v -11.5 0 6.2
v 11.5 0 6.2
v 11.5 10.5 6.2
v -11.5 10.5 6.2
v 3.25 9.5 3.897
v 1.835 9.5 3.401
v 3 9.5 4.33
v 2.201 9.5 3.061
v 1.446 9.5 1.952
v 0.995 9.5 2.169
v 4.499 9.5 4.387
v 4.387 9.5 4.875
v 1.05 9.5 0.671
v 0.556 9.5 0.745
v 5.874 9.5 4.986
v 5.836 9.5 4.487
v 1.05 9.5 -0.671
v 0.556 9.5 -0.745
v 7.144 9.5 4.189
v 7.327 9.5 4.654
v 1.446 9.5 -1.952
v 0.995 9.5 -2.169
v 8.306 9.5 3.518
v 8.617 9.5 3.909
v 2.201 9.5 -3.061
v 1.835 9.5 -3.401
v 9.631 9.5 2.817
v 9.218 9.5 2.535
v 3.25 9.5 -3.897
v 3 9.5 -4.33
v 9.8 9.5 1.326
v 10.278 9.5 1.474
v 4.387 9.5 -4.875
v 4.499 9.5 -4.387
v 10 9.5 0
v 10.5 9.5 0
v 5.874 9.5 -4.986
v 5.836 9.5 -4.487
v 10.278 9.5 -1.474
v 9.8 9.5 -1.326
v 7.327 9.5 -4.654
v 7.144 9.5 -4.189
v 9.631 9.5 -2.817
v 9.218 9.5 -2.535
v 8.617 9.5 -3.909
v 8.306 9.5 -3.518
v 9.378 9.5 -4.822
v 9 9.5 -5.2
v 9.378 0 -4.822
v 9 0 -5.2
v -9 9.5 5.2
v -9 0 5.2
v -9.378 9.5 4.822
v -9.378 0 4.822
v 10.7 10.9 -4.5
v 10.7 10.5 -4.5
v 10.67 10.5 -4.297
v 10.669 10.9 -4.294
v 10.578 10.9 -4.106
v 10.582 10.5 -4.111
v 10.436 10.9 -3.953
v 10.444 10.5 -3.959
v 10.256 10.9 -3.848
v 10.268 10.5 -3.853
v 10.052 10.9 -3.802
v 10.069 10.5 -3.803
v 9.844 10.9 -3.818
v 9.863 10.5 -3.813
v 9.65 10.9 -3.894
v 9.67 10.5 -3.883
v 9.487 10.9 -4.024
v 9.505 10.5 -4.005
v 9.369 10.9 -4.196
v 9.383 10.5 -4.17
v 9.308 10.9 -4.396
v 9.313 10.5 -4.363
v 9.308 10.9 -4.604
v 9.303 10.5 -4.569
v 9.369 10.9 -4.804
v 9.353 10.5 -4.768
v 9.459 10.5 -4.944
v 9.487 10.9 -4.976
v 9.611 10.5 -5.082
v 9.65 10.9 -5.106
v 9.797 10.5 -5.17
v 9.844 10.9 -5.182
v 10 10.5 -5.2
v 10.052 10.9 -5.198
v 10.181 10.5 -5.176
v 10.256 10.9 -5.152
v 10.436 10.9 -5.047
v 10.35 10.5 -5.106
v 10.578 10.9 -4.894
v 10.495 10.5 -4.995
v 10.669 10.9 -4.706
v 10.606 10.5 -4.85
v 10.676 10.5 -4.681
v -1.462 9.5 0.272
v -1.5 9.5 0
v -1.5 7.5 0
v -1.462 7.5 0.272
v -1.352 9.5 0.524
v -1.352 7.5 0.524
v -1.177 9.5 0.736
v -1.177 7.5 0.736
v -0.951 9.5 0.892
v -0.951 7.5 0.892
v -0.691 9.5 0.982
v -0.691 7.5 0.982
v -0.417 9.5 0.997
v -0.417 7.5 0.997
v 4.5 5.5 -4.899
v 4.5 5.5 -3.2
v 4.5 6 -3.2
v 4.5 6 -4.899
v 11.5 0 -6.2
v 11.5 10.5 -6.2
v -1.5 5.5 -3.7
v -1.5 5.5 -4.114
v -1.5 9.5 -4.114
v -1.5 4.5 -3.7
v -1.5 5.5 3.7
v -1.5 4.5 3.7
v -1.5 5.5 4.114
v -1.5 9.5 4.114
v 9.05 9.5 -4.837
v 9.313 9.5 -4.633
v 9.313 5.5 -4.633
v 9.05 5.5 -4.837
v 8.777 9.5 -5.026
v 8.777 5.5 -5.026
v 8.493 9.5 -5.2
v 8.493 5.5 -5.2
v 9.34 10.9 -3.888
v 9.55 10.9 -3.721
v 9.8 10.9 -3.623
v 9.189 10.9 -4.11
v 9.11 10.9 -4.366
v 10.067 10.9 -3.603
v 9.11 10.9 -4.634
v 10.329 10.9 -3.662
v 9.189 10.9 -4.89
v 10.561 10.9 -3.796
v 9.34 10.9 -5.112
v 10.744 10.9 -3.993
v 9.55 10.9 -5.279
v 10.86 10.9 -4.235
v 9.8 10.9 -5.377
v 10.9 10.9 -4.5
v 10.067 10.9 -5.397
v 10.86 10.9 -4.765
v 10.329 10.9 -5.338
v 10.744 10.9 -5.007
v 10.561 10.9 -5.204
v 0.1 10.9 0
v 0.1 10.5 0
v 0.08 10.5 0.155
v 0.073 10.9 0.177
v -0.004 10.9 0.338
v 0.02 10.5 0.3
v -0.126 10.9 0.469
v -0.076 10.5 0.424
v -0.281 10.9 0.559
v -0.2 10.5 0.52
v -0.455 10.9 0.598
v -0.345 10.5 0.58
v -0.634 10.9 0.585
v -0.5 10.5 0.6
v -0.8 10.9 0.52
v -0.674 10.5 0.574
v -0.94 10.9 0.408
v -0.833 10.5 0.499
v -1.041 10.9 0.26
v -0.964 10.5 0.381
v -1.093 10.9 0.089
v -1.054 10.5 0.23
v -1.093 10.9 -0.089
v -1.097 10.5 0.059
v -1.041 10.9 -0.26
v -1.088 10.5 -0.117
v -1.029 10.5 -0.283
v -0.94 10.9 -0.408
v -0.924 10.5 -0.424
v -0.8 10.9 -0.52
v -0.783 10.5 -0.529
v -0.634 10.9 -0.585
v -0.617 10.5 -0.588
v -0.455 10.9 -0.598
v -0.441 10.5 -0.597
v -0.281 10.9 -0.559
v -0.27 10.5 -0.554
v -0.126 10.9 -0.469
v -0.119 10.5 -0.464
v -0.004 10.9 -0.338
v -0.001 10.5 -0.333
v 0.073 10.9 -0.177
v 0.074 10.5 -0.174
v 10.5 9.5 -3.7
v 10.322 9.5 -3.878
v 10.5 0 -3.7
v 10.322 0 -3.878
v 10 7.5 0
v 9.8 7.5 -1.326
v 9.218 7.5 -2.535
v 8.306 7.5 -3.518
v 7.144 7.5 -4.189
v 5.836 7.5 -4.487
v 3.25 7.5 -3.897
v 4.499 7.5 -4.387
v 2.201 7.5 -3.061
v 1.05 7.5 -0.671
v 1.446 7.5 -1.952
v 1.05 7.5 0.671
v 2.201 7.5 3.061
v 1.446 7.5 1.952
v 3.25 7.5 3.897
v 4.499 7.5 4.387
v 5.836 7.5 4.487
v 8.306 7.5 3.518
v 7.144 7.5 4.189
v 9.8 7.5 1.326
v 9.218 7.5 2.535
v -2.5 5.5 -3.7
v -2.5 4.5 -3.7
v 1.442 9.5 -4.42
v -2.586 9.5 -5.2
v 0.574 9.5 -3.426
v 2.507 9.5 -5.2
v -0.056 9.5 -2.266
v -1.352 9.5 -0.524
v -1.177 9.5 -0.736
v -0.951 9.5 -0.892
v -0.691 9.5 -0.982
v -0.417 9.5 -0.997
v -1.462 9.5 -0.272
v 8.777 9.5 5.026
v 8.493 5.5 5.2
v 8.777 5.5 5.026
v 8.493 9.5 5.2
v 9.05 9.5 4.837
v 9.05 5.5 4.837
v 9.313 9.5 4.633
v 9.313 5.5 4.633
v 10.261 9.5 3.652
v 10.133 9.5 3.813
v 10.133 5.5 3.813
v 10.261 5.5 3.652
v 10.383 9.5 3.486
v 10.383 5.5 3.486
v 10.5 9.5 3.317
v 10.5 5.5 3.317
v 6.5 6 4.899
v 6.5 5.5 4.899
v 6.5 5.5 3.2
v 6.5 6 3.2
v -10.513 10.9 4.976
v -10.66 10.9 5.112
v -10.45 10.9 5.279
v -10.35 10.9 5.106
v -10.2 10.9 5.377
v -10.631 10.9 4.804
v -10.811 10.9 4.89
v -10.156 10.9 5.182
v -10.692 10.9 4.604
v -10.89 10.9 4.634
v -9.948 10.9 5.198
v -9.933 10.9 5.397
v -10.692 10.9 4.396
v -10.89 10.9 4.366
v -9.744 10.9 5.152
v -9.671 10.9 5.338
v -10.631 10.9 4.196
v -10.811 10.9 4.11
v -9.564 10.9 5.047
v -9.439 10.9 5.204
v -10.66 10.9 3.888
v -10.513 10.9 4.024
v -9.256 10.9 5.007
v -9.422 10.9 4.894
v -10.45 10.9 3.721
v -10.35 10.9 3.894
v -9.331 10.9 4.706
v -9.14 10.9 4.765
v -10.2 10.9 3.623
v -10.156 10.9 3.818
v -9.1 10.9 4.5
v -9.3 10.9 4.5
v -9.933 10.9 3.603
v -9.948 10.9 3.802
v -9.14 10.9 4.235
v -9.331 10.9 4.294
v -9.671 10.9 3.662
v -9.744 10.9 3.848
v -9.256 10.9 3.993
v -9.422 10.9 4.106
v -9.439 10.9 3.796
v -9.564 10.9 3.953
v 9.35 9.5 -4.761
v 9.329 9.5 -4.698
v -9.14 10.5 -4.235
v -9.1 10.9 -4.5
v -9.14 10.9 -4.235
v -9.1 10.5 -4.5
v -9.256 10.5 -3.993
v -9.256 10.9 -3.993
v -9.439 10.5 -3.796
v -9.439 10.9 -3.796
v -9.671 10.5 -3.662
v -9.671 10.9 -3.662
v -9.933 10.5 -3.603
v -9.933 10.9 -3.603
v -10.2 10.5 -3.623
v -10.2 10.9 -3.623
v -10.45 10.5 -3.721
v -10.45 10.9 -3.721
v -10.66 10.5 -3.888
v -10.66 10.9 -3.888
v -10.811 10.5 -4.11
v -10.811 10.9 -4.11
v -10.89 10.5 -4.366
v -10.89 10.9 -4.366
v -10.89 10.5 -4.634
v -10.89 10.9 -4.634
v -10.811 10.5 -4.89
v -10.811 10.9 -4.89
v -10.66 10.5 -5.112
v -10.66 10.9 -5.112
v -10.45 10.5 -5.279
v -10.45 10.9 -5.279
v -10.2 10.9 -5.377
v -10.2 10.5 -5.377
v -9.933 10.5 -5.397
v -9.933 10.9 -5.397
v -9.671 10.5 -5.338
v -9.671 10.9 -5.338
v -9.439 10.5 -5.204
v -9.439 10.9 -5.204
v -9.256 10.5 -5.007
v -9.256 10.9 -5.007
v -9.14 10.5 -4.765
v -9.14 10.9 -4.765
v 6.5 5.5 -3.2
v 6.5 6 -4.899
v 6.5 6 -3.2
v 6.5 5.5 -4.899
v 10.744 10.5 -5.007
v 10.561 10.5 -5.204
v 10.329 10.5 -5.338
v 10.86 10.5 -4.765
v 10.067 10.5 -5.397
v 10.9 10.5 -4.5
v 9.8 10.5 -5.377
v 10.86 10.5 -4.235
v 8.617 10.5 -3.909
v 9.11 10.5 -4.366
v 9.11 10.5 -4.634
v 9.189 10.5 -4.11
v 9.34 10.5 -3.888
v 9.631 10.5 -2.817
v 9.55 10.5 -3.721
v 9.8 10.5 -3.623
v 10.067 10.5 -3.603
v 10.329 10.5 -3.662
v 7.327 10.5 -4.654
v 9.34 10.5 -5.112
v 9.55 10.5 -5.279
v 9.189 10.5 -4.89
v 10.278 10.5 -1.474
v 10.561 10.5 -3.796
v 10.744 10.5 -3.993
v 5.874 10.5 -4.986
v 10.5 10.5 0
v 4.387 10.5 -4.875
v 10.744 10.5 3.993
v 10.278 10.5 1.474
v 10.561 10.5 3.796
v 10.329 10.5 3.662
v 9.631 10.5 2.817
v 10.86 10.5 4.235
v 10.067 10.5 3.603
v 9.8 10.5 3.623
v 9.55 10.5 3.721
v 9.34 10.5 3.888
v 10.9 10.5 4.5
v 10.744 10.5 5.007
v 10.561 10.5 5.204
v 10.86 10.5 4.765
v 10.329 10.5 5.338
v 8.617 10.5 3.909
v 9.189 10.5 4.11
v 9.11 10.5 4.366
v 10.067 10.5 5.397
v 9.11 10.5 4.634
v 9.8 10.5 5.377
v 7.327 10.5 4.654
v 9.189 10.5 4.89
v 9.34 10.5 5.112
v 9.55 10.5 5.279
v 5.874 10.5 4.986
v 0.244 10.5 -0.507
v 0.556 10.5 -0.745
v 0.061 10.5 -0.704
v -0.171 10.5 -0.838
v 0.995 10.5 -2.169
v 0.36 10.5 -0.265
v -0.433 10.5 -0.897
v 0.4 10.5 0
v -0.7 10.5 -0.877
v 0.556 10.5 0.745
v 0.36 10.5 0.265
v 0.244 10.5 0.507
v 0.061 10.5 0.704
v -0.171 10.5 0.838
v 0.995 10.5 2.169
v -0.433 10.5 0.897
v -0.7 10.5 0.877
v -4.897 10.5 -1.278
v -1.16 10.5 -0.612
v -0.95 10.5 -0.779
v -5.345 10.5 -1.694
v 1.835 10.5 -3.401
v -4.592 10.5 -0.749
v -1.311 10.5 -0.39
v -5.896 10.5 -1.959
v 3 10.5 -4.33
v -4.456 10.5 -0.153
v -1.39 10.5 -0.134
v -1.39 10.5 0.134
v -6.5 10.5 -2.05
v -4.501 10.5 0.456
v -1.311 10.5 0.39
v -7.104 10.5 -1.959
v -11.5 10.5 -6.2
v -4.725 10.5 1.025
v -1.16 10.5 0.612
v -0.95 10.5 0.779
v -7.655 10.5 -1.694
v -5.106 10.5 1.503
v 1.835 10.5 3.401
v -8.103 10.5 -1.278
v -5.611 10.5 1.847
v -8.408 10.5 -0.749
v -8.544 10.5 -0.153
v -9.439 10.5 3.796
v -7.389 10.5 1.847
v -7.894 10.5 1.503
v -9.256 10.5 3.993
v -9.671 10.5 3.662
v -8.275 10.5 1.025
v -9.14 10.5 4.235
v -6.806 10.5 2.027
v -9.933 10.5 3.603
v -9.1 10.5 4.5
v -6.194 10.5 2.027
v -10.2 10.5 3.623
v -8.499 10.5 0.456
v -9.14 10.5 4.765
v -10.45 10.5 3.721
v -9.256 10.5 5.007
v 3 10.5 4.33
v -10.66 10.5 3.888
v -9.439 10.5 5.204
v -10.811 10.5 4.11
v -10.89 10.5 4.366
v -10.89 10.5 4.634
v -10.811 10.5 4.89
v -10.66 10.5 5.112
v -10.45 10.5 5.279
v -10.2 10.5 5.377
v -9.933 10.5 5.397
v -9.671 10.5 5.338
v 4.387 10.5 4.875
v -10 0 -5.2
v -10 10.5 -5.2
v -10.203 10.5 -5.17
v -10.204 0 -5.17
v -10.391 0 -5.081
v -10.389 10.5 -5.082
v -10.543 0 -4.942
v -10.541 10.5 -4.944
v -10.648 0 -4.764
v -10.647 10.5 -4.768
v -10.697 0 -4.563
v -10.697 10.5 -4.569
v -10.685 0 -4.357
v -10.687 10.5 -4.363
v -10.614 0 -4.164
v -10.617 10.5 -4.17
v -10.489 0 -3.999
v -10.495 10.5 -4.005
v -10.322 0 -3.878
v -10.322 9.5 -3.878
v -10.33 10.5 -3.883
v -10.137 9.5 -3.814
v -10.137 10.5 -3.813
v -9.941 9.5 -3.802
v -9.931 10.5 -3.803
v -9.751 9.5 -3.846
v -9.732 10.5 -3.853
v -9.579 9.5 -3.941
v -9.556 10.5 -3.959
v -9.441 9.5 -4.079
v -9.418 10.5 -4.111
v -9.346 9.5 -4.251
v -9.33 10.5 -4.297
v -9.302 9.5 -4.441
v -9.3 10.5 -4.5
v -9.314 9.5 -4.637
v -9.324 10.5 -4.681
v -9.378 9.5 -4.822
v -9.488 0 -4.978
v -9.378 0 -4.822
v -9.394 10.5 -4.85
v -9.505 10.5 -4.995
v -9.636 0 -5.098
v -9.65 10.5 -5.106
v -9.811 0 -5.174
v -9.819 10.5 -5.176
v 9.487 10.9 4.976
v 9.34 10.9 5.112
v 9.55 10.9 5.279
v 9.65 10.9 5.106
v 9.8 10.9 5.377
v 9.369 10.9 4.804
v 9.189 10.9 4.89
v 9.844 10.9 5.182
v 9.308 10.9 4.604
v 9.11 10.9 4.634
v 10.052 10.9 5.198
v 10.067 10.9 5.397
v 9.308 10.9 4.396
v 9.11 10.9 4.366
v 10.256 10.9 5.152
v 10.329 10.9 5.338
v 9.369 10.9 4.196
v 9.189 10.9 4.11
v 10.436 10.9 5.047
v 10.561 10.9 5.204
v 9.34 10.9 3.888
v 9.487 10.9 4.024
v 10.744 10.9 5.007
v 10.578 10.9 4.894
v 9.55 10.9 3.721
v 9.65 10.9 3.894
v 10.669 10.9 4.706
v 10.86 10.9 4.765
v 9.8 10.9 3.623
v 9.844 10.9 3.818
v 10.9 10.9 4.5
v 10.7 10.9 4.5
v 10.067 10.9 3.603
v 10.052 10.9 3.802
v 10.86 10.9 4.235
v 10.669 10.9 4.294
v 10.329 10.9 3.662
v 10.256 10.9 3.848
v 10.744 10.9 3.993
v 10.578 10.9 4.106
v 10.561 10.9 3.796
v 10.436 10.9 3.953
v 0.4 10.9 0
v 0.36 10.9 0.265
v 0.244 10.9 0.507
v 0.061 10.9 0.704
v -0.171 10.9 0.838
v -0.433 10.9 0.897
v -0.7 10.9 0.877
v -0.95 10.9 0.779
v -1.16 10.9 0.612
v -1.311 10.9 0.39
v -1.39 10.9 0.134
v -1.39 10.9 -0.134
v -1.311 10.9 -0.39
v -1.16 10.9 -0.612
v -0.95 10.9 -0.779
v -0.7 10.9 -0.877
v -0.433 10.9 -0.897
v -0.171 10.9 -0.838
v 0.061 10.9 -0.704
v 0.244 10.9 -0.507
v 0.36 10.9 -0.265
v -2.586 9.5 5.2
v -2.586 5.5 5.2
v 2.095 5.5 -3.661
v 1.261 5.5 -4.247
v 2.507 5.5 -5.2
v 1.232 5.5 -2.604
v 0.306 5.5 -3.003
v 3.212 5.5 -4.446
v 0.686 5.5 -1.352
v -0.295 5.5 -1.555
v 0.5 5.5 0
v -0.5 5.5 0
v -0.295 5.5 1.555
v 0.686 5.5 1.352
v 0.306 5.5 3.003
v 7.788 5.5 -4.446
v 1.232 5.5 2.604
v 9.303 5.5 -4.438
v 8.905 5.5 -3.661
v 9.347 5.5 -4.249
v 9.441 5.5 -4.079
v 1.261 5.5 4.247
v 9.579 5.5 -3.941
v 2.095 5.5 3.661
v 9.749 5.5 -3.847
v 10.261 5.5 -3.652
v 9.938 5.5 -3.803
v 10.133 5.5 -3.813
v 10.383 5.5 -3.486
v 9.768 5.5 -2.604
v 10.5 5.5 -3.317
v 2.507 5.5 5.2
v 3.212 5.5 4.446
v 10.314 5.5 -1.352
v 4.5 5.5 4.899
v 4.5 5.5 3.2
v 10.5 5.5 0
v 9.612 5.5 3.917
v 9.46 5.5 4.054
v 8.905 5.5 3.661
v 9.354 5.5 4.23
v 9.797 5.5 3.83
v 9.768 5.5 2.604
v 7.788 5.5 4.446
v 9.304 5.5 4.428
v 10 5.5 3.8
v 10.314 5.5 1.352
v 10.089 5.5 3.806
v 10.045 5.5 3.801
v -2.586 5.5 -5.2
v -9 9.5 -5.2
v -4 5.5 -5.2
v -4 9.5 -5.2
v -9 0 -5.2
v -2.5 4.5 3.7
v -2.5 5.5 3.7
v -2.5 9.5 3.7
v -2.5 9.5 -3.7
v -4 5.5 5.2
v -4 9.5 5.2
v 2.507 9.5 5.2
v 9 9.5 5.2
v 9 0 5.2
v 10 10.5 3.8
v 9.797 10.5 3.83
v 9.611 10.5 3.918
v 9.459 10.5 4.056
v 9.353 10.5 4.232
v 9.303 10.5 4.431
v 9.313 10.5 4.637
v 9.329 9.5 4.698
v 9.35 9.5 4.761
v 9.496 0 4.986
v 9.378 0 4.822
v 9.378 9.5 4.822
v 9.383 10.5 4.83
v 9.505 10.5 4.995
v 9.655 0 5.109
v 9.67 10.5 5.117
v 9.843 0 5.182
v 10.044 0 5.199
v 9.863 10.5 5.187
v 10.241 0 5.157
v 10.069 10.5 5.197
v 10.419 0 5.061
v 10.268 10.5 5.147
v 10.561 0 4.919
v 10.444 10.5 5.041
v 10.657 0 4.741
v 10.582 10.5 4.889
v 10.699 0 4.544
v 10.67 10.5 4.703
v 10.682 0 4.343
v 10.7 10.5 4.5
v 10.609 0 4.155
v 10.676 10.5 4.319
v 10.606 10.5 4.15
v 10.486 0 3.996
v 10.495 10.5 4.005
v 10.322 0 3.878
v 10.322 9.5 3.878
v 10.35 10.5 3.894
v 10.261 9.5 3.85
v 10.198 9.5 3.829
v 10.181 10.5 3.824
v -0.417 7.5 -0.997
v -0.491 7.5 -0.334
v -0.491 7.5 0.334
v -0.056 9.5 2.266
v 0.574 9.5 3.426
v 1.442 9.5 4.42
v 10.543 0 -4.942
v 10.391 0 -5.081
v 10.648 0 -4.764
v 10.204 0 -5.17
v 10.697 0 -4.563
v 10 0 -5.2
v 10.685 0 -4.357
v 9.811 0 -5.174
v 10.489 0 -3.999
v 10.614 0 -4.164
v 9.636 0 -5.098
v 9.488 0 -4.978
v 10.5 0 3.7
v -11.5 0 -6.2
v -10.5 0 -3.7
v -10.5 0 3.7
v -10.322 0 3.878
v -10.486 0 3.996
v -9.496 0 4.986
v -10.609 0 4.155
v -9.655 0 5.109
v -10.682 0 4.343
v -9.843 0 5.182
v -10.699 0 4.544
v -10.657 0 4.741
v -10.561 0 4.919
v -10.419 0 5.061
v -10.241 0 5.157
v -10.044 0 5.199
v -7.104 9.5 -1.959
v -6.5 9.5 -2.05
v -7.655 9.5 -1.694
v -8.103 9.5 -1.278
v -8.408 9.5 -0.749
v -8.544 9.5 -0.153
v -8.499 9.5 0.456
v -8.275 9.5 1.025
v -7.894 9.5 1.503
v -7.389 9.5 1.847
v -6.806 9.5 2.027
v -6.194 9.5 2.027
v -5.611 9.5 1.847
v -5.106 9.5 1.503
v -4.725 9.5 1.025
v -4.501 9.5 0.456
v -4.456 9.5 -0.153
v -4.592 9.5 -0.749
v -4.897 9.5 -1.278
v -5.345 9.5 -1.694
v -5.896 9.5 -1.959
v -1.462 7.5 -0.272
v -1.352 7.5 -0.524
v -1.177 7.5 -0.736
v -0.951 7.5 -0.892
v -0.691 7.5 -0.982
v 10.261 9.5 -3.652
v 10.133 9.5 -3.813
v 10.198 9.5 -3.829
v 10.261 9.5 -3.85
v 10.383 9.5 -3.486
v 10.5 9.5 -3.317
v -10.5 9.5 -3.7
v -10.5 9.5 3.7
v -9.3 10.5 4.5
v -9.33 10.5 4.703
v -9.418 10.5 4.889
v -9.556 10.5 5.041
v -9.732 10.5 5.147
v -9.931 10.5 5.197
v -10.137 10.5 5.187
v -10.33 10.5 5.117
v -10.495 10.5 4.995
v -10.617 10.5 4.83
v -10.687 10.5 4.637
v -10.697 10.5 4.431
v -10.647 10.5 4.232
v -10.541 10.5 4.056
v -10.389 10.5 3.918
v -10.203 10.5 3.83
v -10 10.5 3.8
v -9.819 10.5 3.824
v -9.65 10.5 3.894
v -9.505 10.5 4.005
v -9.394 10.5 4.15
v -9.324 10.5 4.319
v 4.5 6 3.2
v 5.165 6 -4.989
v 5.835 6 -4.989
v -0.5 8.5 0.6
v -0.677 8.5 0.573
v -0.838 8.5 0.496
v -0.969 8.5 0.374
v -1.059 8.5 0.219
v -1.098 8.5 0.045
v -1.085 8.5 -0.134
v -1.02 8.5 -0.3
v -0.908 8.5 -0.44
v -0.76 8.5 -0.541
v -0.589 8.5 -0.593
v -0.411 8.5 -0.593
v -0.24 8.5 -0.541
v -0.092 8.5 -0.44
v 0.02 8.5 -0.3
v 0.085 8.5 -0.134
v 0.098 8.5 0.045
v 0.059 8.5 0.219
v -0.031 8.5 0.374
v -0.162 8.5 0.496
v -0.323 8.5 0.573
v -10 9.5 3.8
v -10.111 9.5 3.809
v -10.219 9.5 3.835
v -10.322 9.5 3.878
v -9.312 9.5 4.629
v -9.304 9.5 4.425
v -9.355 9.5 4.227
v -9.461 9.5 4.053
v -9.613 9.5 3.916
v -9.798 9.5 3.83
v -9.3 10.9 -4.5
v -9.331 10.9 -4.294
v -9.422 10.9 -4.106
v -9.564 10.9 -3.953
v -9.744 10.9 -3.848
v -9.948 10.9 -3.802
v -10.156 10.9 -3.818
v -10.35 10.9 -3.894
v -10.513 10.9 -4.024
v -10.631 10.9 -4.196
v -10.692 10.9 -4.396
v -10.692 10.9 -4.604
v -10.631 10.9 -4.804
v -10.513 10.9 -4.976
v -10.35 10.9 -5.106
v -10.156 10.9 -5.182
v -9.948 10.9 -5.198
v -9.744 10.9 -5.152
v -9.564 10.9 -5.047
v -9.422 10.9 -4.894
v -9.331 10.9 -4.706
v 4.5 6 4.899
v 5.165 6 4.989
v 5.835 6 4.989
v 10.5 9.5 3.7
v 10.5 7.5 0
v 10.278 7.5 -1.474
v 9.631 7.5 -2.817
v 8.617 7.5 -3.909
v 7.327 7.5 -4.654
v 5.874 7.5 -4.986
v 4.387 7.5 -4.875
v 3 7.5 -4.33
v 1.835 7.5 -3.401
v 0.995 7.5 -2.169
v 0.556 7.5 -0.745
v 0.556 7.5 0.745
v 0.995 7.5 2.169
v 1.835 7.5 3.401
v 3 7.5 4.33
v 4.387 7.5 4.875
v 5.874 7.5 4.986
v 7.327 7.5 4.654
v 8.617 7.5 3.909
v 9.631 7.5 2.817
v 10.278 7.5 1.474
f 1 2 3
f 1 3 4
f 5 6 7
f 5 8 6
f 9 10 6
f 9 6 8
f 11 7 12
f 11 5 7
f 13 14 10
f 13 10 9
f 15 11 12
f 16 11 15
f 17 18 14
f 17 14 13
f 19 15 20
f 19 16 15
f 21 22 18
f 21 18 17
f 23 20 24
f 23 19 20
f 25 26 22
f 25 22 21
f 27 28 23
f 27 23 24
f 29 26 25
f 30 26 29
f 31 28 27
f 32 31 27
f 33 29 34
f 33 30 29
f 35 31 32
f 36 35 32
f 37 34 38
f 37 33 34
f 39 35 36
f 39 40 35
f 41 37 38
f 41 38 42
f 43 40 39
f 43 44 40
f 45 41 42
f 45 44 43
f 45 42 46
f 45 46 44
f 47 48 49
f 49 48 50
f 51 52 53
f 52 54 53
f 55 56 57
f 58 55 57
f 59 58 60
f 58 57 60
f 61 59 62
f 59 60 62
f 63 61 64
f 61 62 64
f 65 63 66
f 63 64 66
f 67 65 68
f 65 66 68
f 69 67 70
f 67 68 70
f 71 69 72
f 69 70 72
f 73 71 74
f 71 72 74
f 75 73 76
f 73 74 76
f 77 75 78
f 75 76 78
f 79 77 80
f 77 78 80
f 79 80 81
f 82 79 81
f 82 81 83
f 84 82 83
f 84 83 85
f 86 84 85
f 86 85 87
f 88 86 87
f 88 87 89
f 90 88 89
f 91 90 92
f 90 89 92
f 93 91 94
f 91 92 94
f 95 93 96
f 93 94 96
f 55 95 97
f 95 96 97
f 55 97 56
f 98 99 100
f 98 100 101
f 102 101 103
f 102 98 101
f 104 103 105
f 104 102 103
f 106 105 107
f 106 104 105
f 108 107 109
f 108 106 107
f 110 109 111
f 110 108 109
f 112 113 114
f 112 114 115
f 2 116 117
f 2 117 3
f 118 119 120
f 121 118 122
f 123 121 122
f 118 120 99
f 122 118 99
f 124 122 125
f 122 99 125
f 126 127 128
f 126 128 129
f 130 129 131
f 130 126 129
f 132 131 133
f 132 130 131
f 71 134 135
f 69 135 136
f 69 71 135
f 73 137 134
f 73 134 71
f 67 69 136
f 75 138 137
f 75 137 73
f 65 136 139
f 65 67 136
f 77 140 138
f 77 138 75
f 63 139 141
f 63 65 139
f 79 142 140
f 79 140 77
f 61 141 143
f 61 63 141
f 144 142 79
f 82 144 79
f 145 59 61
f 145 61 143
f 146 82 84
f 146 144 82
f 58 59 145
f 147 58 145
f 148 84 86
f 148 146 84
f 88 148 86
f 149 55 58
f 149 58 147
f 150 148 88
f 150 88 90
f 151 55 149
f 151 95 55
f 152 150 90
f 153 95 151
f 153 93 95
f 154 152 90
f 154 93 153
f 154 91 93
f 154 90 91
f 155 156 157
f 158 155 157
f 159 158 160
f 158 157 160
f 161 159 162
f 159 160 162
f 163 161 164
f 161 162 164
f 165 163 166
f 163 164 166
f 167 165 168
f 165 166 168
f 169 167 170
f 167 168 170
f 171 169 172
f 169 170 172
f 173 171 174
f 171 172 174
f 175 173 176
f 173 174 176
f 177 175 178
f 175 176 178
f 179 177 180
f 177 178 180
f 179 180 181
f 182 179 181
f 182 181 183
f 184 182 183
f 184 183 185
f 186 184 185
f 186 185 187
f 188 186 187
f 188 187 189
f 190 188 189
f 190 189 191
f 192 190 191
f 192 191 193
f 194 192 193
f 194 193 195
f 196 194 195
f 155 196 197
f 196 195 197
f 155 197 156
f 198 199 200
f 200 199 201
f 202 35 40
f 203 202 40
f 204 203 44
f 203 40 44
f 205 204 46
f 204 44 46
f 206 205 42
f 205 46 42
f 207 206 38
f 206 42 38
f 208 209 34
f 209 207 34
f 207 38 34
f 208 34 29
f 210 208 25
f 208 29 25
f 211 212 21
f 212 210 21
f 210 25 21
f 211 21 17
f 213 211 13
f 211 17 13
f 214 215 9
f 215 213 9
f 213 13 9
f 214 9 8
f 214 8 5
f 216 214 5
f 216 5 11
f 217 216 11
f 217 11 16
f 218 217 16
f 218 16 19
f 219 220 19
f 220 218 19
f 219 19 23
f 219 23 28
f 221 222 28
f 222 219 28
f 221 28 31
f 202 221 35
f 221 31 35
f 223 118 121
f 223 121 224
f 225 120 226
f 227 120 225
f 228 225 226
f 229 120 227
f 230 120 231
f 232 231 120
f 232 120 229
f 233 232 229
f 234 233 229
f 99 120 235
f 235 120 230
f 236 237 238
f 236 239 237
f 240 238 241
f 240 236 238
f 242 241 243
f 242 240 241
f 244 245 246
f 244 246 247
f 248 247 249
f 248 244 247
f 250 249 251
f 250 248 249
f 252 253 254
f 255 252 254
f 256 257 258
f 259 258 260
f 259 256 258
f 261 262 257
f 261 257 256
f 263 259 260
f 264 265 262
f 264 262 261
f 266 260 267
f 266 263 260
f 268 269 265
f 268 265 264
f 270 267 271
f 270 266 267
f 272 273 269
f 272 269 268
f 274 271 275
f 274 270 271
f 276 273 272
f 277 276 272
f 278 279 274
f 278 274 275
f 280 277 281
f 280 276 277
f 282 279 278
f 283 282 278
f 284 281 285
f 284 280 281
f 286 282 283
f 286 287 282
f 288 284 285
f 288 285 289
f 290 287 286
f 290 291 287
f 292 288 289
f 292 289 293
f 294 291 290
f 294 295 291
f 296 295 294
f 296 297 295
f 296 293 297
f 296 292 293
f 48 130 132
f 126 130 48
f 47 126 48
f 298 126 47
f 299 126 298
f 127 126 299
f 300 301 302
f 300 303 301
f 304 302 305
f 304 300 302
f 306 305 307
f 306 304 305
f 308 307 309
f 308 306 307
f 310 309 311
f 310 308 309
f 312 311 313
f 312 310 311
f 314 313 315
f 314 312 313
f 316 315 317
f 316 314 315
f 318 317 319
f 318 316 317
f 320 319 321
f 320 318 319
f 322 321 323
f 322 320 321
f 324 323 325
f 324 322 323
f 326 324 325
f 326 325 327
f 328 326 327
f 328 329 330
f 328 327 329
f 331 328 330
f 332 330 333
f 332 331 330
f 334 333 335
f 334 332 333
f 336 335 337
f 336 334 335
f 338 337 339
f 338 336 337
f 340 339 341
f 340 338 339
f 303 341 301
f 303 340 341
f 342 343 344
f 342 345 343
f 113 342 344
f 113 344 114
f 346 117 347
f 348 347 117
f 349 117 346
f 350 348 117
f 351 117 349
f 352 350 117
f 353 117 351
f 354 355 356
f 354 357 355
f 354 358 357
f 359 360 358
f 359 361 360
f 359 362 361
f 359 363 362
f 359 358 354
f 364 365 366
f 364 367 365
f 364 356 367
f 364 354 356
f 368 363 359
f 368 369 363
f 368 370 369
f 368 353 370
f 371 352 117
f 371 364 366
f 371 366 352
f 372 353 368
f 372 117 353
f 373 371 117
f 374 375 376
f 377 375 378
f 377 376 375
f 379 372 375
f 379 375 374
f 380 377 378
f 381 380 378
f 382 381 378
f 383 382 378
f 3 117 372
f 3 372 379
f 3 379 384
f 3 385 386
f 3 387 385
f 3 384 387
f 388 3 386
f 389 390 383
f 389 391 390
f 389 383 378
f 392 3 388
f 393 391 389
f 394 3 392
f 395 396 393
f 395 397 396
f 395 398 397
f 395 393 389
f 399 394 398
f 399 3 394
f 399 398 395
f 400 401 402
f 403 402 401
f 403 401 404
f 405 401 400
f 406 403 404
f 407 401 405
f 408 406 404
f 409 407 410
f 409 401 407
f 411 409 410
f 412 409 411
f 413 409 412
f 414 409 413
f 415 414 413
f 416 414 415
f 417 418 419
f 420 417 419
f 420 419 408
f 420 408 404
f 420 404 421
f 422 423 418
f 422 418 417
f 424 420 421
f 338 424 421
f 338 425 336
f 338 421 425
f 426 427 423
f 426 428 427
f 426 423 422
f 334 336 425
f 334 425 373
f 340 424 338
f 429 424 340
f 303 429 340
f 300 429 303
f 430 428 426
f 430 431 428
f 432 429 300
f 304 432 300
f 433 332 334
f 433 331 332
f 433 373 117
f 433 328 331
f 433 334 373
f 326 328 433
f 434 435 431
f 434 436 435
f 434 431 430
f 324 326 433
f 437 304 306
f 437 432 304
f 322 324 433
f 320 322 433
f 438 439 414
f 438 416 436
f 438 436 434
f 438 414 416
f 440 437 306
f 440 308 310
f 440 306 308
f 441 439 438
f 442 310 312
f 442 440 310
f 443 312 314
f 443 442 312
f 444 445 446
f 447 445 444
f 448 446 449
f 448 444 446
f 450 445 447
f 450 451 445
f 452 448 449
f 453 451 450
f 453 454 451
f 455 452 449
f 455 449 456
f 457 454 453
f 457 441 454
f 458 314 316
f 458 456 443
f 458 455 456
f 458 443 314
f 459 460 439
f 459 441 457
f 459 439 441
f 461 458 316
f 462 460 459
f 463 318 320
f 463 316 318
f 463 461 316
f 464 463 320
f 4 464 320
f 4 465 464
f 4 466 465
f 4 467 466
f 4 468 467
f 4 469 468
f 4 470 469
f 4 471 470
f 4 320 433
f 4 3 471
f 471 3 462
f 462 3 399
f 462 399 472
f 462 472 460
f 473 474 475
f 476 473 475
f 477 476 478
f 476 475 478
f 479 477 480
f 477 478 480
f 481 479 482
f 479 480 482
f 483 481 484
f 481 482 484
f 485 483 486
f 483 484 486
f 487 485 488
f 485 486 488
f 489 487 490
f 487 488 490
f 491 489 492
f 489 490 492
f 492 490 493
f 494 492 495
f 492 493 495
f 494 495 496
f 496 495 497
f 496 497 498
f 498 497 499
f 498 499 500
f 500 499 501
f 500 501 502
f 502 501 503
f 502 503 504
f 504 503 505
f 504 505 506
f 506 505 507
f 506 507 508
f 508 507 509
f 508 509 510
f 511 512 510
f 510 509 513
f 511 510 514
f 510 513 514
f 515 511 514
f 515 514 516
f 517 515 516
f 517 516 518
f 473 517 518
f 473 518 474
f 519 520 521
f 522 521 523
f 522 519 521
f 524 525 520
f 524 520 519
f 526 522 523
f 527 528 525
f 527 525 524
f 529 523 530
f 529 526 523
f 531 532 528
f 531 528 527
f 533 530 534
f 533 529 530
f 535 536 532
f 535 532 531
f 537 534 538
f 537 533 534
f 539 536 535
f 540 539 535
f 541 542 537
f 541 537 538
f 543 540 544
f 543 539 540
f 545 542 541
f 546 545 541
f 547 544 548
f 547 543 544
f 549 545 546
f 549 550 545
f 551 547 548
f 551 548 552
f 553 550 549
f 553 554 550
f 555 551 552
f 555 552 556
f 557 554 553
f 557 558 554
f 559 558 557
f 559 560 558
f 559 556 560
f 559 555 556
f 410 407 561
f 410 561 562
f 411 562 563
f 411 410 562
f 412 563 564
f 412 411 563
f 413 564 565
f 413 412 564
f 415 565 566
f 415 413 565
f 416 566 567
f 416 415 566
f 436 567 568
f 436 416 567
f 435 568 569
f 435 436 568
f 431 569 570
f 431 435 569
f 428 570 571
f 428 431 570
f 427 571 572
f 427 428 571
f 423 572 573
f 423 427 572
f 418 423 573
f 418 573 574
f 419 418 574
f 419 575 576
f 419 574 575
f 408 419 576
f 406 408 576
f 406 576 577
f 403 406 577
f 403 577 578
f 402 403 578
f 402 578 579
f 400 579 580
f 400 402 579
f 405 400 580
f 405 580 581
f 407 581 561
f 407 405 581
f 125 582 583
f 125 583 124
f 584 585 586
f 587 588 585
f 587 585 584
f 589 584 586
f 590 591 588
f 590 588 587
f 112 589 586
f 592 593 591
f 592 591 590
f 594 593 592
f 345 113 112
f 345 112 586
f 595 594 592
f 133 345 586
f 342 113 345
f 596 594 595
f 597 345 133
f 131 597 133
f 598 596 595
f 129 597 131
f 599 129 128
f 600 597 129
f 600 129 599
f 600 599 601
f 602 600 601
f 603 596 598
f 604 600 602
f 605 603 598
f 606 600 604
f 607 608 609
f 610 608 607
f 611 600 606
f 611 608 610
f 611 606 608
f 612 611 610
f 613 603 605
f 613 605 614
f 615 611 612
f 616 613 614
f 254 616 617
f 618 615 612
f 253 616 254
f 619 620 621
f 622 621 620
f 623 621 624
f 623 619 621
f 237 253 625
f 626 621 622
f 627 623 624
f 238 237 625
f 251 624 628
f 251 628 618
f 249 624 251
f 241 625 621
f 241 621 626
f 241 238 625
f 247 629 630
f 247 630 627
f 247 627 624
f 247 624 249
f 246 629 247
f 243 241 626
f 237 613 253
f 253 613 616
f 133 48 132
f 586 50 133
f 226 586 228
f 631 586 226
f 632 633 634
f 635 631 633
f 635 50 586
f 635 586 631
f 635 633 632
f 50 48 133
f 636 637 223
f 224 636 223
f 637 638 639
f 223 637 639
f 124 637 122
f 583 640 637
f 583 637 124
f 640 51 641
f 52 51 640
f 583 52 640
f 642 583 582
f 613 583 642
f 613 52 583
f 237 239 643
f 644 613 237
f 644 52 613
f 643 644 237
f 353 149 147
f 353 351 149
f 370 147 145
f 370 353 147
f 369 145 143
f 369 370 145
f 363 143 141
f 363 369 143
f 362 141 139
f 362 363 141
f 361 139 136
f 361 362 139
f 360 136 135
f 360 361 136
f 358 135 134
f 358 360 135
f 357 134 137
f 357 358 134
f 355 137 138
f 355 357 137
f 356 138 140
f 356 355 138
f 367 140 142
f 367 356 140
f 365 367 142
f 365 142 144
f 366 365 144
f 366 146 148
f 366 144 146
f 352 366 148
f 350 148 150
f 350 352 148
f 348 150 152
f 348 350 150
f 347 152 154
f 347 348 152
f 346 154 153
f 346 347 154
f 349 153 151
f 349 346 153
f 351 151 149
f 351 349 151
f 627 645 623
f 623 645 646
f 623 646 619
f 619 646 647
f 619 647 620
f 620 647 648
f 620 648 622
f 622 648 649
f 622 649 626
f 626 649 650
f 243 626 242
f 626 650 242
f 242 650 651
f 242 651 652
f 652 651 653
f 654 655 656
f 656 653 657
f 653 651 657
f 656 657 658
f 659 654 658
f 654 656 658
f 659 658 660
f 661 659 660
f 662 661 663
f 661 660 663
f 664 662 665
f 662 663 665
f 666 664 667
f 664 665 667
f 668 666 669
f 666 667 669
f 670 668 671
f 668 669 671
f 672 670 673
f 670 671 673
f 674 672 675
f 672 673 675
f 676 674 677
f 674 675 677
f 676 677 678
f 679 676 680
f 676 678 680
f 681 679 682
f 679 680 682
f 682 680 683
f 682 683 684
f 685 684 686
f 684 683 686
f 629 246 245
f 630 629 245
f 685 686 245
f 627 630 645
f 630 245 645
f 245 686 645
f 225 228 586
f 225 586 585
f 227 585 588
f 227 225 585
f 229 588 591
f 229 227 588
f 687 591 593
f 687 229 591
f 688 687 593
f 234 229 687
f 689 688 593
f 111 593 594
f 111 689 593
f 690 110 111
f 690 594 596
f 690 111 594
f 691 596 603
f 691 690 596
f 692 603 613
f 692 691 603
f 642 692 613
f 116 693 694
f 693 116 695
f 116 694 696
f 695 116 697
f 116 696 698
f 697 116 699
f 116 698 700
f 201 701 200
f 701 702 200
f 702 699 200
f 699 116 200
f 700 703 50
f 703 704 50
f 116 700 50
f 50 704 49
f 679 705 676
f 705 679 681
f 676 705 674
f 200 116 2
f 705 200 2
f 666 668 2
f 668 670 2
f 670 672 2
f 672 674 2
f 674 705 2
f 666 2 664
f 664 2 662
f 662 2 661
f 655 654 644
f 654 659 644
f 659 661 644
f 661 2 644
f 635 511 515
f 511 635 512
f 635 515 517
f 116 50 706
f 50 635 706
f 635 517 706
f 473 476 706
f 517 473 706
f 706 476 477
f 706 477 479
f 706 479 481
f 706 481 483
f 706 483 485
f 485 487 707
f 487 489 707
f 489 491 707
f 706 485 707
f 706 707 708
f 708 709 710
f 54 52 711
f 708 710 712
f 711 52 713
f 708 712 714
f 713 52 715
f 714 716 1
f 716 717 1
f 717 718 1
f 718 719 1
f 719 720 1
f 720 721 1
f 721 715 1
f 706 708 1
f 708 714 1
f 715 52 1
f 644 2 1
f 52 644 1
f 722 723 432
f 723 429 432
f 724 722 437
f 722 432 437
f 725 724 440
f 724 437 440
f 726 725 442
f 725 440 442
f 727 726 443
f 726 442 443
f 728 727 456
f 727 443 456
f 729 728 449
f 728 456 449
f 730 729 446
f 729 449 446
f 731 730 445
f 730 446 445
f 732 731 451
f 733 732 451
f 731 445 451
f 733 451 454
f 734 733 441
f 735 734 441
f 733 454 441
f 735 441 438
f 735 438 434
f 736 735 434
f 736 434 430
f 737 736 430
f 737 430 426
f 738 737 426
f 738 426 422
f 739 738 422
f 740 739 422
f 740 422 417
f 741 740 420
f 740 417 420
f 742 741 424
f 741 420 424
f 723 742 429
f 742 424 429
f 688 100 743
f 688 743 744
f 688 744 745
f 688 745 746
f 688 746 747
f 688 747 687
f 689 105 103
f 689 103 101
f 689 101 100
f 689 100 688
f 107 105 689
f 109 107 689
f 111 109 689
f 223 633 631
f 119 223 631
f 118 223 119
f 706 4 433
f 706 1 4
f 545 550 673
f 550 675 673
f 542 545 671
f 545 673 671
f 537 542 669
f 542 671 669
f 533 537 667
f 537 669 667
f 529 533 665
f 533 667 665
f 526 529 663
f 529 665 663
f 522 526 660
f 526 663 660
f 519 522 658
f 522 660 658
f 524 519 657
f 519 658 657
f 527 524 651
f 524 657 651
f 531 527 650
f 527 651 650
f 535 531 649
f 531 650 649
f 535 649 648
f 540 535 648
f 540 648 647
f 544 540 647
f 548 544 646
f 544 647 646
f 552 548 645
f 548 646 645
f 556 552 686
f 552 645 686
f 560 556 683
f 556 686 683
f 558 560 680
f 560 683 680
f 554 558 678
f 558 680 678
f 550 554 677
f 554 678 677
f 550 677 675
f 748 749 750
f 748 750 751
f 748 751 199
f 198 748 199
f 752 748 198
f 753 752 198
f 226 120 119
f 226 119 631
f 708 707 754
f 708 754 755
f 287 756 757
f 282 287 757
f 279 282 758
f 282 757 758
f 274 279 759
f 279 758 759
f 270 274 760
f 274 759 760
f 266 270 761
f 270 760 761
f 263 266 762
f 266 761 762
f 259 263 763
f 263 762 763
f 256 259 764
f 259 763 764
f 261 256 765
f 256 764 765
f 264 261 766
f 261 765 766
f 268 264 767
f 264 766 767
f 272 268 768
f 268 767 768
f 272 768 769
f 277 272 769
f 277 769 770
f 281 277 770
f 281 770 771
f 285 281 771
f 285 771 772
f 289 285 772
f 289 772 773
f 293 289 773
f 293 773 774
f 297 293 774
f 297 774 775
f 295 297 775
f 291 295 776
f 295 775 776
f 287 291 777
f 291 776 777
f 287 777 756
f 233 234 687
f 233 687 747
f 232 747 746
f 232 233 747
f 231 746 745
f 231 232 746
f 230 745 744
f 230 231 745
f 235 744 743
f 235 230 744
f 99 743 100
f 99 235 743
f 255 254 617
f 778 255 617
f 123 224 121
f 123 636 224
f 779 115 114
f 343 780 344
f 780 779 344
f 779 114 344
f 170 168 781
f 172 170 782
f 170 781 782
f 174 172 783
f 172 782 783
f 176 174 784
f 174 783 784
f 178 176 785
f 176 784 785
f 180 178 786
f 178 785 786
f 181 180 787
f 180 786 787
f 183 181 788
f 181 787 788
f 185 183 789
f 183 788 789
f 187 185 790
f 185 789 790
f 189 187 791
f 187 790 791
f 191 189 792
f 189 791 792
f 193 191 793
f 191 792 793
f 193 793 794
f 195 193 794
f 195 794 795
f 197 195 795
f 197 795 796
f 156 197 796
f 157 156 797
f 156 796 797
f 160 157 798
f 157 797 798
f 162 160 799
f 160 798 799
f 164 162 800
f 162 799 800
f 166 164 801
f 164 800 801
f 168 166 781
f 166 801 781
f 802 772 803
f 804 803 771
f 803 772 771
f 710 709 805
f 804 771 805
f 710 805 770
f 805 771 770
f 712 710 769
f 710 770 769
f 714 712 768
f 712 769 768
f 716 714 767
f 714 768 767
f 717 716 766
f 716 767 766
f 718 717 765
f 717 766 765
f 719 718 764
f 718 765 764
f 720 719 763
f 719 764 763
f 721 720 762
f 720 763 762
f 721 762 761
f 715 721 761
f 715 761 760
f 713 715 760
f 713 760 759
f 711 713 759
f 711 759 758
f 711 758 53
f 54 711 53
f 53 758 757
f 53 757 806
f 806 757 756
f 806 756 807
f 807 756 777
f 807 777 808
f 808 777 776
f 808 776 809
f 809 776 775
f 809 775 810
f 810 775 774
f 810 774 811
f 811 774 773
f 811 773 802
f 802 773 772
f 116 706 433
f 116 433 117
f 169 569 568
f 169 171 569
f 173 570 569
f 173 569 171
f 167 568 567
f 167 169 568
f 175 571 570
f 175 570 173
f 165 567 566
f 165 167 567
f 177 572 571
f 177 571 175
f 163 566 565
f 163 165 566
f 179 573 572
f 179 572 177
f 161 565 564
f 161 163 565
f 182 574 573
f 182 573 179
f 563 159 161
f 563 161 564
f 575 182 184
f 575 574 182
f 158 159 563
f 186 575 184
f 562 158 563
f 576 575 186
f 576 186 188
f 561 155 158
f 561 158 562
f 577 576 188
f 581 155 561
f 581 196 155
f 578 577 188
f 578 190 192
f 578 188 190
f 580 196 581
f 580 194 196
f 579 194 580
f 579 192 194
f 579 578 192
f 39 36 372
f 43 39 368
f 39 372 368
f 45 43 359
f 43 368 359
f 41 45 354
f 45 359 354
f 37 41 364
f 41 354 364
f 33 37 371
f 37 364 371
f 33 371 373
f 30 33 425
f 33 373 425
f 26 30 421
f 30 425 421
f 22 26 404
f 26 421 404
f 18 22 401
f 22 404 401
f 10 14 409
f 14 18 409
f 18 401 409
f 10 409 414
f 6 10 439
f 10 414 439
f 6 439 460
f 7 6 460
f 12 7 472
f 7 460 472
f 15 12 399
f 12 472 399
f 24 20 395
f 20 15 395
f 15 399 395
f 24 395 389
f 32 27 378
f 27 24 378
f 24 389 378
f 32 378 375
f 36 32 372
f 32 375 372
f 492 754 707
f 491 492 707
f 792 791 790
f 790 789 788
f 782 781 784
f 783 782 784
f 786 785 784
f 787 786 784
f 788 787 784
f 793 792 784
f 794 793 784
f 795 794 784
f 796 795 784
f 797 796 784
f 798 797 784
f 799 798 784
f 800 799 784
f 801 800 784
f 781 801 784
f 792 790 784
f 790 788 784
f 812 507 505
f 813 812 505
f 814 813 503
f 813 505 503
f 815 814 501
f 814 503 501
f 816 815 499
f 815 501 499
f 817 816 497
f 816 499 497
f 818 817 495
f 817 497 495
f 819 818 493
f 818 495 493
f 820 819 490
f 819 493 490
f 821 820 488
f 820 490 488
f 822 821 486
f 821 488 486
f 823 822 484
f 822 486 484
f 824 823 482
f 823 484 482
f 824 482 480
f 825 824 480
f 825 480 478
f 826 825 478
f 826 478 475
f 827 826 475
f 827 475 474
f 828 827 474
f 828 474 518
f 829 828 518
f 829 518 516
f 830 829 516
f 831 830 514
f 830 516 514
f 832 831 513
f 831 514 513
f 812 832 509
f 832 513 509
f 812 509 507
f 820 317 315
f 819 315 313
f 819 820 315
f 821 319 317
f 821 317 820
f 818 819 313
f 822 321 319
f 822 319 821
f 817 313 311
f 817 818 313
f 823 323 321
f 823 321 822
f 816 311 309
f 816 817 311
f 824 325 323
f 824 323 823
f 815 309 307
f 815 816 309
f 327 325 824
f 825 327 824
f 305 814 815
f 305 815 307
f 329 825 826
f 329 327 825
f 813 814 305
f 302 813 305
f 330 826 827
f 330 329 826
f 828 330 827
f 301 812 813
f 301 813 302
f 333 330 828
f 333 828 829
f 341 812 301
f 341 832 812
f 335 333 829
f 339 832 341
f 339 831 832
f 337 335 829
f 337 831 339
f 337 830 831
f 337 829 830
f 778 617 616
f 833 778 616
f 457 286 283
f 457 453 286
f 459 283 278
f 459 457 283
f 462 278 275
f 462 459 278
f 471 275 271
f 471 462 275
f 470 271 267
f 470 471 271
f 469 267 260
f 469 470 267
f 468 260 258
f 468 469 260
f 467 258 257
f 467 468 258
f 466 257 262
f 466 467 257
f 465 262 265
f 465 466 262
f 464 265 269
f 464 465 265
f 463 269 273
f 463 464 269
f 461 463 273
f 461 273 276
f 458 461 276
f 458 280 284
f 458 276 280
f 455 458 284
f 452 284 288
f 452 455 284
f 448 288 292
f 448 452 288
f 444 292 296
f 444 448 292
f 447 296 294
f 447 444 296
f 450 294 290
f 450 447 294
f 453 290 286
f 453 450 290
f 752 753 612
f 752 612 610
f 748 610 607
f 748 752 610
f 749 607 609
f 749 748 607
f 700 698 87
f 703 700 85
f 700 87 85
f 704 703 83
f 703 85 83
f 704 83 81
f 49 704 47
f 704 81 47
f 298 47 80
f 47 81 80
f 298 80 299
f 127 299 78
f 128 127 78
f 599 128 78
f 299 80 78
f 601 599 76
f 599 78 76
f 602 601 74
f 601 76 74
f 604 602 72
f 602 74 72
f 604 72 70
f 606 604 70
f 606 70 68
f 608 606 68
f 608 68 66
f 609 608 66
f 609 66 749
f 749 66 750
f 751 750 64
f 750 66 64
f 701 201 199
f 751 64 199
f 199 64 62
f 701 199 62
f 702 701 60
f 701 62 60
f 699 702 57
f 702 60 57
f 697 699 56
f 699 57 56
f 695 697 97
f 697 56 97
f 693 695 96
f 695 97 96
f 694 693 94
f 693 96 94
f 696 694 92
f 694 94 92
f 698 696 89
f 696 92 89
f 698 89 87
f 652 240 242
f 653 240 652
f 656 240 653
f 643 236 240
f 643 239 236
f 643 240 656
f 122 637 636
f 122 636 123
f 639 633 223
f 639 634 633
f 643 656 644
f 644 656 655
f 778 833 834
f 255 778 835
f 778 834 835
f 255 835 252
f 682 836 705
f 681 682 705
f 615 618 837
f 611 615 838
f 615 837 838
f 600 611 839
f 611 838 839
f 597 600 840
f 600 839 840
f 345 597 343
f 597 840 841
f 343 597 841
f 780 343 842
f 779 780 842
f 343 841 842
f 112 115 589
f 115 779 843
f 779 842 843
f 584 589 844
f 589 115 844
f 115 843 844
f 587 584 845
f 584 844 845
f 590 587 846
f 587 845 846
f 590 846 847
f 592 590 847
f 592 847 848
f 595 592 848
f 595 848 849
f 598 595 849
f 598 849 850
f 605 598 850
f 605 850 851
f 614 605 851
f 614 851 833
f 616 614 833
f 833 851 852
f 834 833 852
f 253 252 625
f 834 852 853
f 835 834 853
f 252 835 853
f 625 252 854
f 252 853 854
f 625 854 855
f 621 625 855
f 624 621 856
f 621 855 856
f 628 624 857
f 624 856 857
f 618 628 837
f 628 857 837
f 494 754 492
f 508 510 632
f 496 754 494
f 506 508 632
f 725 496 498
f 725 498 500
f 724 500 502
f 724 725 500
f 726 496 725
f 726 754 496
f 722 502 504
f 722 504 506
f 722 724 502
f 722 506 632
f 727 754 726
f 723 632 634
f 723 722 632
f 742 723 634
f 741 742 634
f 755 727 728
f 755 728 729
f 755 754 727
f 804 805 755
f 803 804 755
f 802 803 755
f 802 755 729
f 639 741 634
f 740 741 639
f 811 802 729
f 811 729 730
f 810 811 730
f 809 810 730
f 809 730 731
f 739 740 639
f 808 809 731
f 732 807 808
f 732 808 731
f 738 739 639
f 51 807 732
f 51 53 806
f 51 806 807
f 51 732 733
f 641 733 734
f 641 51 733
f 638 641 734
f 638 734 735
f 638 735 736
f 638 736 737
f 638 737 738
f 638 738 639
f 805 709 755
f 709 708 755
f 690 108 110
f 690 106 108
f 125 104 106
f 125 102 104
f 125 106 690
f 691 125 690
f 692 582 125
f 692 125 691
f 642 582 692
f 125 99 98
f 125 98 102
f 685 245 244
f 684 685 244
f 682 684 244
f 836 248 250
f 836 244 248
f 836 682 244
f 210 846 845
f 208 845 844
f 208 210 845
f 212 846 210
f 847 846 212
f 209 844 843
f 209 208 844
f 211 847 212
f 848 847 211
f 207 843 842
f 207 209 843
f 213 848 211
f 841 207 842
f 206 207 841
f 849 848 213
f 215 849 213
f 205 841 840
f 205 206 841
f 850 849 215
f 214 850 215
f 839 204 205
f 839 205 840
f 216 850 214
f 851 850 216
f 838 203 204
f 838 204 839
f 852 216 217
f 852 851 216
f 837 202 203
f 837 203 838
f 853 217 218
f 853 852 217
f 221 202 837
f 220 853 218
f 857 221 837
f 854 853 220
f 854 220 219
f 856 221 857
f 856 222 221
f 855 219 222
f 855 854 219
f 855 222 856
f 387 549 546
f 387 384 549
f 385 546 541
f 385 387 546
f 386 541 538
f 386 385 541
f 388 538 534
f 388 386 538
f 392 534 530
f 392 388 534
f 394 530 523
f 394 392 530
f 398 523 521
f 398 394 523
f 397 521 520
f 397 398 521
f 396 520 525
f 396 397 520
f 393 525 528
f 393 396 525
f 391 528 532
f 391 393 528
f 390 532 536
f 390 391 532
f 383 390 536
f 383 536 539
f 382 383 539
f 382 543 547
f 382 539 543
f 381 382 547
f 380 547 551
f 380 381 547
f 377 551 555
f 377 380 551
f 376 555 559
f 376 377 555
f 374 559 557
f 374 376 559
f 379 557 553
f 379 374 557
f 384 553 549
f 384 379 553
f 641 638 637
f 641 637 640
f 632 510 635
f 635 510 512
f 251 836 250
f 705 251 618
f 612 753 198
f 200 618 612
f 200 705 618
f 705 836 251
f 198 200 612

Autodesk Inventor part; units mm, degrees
ref_plane "YZ Plane" through (0, 0, 0) normal (1, 0, 0) x (0, 1, 0)
ref_plane "XZ Plane" through (0, 0, 0) normal (0, 1, 0) x (-1, 0, 0)
ref_plane "XY Plane" through (0, 0, 0) normal (0, 0, 1) x (1, 0, 0)
sketch "Эскиз1" plane through (0, 0, 0) normal (0, 1, 0) x (-1, 0, 0)
  line L0 (-11.5, 6.2) -> (11.5, 6.2)
  line L1 (11.5, 6.2) -> (11.5, -6.2)
  line L2 (11.5, -6.2) -> (-11.5, -6.2)
  line L3 (-11.5, -6.2) -> (-11.5, 6.2)
  line L4 (-11.5, 6.2) -> (11.5, -6.2) construction
  line L5 (11.5, 6.2) -> (-11.5, -6.2) construction
  point P0 (0, 0)
  dimension "d0" = 12.4
  dimension "d1" = 23
extrude "Выдавливание1" add sketch "Эскиз1" along normal blind 10.5
sketch "Эскиз2" plane through (0, 0, 0) normal (0, -1, 0) x (1, 0, 0)
  line L0 (11.5, 6.2) -> (-11.5, 6.2) projected
  line L1 (-11.5, 6.2) -> (-11.5, -6.2) projected
  line L2 (-11.5, -6.2) -> (11.5, -6.2) projected
  line L3 (11.5, -6.2) -> (11.5, 6.2) projected
  line L4 (-10.5, 5.2) -> (10.5, 5.2)
  line L5 (10.5, 5.2) -> (10.5, -5.2)
  line L6 (10.5, -5.2) -> (-10.5, -5.2)
  line L7 (-10.5, -5.2) -> (-10.5, 5.2)
  point P0 (0, 0)
  dimension "d66" = 1
extrude "Выдавливание2" cut sketch "Эскиз2" against normal blind 9.5 contours L4 L5 L6 L7
chamfer "Фаска1" distance 1.5 angle 45 4 edges at (-10.5, 4.75, 5.2) (10.5, 4.75, 5.2) (10.5, 4.75, -5.2) (-10.5, 4.75, -5.2)
sketch "Эскиз3" plane through (0, 9.5, 0) normal (0, -1, 0) x (1, 0, 0)
  line L0 (9, -5.2) -> (-9, -5.2) projected
  line L1 (-4, -5.2) -> (-2.5, -3.7)
  line L2 (-2.5, -3.7) -> (-2.5, 3.7)
  line L3 (-2.5, 3.7) -> (-4, 5.2)
  line L4 (-9, 5.2) -> (9, 5.2) projected
  line L5 (-16.1, 0) -> (16.1, 0) projected
  line L6 (-10.5, -3.7) -> (-10.5, 3.7) projected
  line L7 (-2.5858, 5.2) -> (-1.5, 4.1142)
  line L8 (-1.5, 4.1142) -> (-1.5, -4.1142)
  line L9 (-1.5, -4.1142) -> (-2.5858, -5.2)
  point P0 (0, 0)
  dimension "d9" = 1.5
  dimension "d10" = 8
  dimension "d11" = 1
  dimension "d12" = 1
extrude "Выдавливание3" add sketch "Эскиз3" along normal blind 4
sketch "Эскиз4" plane through (0, 5.5, 0) normal (0, -1, 0) x (1, 0, 0)
  line L0 (-2.5, 3.7) -> (-2.5, -3.7) projected
  line L1 (-1.5, -4.1142) -> (-1.5, 4.1142) projected
  line L2 (-2.5, 3.7) -> (-1.5, 3.7)
  line L3 (-1.5, 3.7) -> (-1.5, -3.7)
  line L4 (-1.5, -3.7) -> (-2.5, -3.7)
  line L5 (-2.5, -3.7) -> (-2.5, 3.7)
  point P0 (0, 0)
extrude "Выдавливание4" add sketch "Эскиз4" along normal blind 1
sketch "Эскиз5" plane through (0, 9.5, 0) normal (0, -1, 0) x (1, 0, 0)
  line L0 (-10.5, -3.7) -> (-10.5, 3.7) projected
  line L1 (-2.5, -3.7) -> (-2.5, 3.7) projected
  line L2 (-9, 5.2) -> (9, 5.2) projected
  line L3 (9, -5.2) -> (-9, -5.2) projected
  line L4 (-2.5, 3.7) -> (-2.5, -3.7) projected
  point P0 (0, 0)
  point P1 (-6.5, 0)
  point P2 (-2.5, 0)
  dimension "d64" = 8
  dimension "d65" = 4
hole "Отверстие1" at (-6.5, 9.5, 0) direction (0, 1, 0) diameter 4.1 depth 8 tip angle 118
sketch "Эскиз6" plane through (0, 9.5, 0) normal (0, -1, 0) x (1, 0, 0)
  circle A0 centre (5.5, 0) radius 5
  line L0 (10.5, 3.7) -> (10.5, -3.7) projected
  line L1 (-16.1, 0) -> (16.1, 0) projected
  line L2 (10.5, 3.7) -> (10.5, -3.7) projected
  circle A1 centre (5.5, 0) radius 6
  point P0 (0, 0)
  dimension "d24" = 10
  dimension "d25" = 1
extrude "Выдавливание5" add sketch "Эскиз6" along normal blind 4 contours L0 A1 L1 A0 | A0 L1 A1 L0 | L1 A1 L0 | L0 A1 L1
sketch "Эскиз7" plane through (5.5, 9.5, 0) normal (0, -1, 0) x (1, 0, 0)
  circle A0 centre (0, 0) radius 5 projected
  circle A1 centre (0, 0) radius 4.5
  point P0 (-5.5, 0)
  dimension "d28" = 9
extrude "Выдавливание6" cut sketch "Эскиз7" against normal blind 5 contours A1
sketch "Эскиз8" plane through (5.5, 9.5, 0) normal (0, -1, 0) x (1, 0, 0)
  circle A0 centre (0, 0) radius 4.5 projected
  circle A1 centre (0, 0) radius 5 projected
  point P0 (-5.5, 0)
extrude "Выдавливание7" add sketch "Эскиз8" along normal blind 2
sketch "Эскиз9" plane through (0, 10.5, 0) normal (0, 1, 0) x (1, 0, 0)
  circle A0 centre (5.5, 0) radius 4.5 projected
  circle A1 centre (5.5, 0) radius 5
  point P0 (0, 0)
  dimension "d33" = 10
extrude "Выдавливание8" cut sketch "Эскиз9" against normal blind 1
sketch "Эскиз10" plane through (0, 5.5, 0) normal (0, -1, 0) x (1, 0, 0)
  line L0 (2.5067, 5.2) -> (8.4933, 5.2) projected
  line L1 (4.5, 5.2) -> (6.5, 5.2)
  line L2 (6.5, 5.2) -> (6.5, 3.2)
  line L3 (6.5, 3.2) -> (4.5, 3.2)
  line L4 (4.5, 3.2) -> (4.5, 5.2)
  line L5 (9, -5.2) -> (-9, -5.2) projected
  line L6 (4.5, -5.2) -> (6.5, -5.2)
  line L7 (6.5, -5.2) -> (6.5, -3.2)
  line L8 (6.5, -3.2) -> (4.5, -3.2)
  line L9 (4.5, -3.2) -> (4.5, -5.2)
  line L10 (-16.1, 0) -> (16.1, 0) projected
  circle A0 centre (5.5, 0) radius 4.5 projected
  point P0 (0, 0)
  point P1 (5.5, 3.2)
  dimension "d36" = 2
  dimension "d37" = 2
extrude "Выдавливание9" add sketch "Эскиз10" against normal blind 0.5 contours L0 L2 A0 L4 | A0 L2 L3 L4 | A0 L7 L5 L9 | L9 L8 L7 A0
sketch "Эскиз11" plane through (0, 9.5, 0) normal (0, -1, 0) x (1, 0, 0)
  circle A0 centre (-0.5, 0) radius 1
  line L0 (-11.5, 6.2) -> (-11.5, -6.2) projected
  point P0 (0, 0)
  dimension "d40" = 11
  dimension "d41" = 2
extrude "Выдавливание10" add sketch "Эскиз11" along normal blind 2
sketch "Эскиз12" plane through (0, 10.5, 0) normal (0, 1, 0) x (1, 0, 0)
  arc A0 (-1.5, 0) -> (-0.4167, -0.9965) centre (-0.5, 0) ccw projected
  line L0 (-11.5, 6.2) -> (-11.5, -6.2) projected
  circle A1 centre (-6.428, 0) radius 2.05 projected
  point P0 (0, 0)
  point P1 (-1.5, -0.866)
  dimension "d63" = 11
hole "Отверстие2" at (-0.5, 10.5, 0) direction (0, -1, 0) diameter 1.2 depth 2
sketch "Эскиз13" plane through (0, 0, 0) normal (0, -1, 0) x (1, 0, 0)
  line L0 (-10, -4.5) -> (10, -4.5)
  line L1 (10, -4.5) -> (10, 4.5)
  line L2 (10, 4.5) -> (-10, 4.5)
  line L3 (-10, 4.5) -> (-10, -4.5)
  line L4 (-10, -4.5) -> (10, 4.5) construction
  line L5 (10, -4.5) -> (-10, 4.5) construction
  point P0 (0, 0)
  dimension "d51" = 9
  dimension "d52" = 20
hole "Отверстие3" at (10, 0, 4.5) at (10, 0, -4.5) at (-10, 0, 4.5) at (-10, 0, -4.5) direction (0, 1, 0) diameter 1.4 depth 12 tip angle 118
sketch "Эскиз14" plane through (0, 10.5, 0) normal (0, 1, 0) x (1, 0, 0)
  circle A0 centre (10, 4.5) radius 0.7 projected
  circle A1 centre (10, -4.5) radius 0.7 projected
  circle A2 centre (-10, -4.5) radius 0.7 projected
  circle A3 centre (-10, 4.5) radius 0.7 projected
  circle A4 centre (10, 4.5) radius 0.9
  circle A5 centre (-10, 4.5) radius 0.9
  circle A6 centre (-10, -4.5) radius 0.9
  circle A7 centre (10, -4.5) radius 0.9
  circle A8 centre (-0.5, 0) radius 0.6 projected
  circle A9 centre (-0.5, 0) radius 0.9
  point P0 (0, 0)
  dimension "d60" = 1.8
extrude "Выдавливание11" add sketch "Эскиз14" along normal blind 0.4
equation "\"d65\" = 0.5 * d64"
properties part number "основание крпуса редуктора" material "Пластик ПК/АБС"
